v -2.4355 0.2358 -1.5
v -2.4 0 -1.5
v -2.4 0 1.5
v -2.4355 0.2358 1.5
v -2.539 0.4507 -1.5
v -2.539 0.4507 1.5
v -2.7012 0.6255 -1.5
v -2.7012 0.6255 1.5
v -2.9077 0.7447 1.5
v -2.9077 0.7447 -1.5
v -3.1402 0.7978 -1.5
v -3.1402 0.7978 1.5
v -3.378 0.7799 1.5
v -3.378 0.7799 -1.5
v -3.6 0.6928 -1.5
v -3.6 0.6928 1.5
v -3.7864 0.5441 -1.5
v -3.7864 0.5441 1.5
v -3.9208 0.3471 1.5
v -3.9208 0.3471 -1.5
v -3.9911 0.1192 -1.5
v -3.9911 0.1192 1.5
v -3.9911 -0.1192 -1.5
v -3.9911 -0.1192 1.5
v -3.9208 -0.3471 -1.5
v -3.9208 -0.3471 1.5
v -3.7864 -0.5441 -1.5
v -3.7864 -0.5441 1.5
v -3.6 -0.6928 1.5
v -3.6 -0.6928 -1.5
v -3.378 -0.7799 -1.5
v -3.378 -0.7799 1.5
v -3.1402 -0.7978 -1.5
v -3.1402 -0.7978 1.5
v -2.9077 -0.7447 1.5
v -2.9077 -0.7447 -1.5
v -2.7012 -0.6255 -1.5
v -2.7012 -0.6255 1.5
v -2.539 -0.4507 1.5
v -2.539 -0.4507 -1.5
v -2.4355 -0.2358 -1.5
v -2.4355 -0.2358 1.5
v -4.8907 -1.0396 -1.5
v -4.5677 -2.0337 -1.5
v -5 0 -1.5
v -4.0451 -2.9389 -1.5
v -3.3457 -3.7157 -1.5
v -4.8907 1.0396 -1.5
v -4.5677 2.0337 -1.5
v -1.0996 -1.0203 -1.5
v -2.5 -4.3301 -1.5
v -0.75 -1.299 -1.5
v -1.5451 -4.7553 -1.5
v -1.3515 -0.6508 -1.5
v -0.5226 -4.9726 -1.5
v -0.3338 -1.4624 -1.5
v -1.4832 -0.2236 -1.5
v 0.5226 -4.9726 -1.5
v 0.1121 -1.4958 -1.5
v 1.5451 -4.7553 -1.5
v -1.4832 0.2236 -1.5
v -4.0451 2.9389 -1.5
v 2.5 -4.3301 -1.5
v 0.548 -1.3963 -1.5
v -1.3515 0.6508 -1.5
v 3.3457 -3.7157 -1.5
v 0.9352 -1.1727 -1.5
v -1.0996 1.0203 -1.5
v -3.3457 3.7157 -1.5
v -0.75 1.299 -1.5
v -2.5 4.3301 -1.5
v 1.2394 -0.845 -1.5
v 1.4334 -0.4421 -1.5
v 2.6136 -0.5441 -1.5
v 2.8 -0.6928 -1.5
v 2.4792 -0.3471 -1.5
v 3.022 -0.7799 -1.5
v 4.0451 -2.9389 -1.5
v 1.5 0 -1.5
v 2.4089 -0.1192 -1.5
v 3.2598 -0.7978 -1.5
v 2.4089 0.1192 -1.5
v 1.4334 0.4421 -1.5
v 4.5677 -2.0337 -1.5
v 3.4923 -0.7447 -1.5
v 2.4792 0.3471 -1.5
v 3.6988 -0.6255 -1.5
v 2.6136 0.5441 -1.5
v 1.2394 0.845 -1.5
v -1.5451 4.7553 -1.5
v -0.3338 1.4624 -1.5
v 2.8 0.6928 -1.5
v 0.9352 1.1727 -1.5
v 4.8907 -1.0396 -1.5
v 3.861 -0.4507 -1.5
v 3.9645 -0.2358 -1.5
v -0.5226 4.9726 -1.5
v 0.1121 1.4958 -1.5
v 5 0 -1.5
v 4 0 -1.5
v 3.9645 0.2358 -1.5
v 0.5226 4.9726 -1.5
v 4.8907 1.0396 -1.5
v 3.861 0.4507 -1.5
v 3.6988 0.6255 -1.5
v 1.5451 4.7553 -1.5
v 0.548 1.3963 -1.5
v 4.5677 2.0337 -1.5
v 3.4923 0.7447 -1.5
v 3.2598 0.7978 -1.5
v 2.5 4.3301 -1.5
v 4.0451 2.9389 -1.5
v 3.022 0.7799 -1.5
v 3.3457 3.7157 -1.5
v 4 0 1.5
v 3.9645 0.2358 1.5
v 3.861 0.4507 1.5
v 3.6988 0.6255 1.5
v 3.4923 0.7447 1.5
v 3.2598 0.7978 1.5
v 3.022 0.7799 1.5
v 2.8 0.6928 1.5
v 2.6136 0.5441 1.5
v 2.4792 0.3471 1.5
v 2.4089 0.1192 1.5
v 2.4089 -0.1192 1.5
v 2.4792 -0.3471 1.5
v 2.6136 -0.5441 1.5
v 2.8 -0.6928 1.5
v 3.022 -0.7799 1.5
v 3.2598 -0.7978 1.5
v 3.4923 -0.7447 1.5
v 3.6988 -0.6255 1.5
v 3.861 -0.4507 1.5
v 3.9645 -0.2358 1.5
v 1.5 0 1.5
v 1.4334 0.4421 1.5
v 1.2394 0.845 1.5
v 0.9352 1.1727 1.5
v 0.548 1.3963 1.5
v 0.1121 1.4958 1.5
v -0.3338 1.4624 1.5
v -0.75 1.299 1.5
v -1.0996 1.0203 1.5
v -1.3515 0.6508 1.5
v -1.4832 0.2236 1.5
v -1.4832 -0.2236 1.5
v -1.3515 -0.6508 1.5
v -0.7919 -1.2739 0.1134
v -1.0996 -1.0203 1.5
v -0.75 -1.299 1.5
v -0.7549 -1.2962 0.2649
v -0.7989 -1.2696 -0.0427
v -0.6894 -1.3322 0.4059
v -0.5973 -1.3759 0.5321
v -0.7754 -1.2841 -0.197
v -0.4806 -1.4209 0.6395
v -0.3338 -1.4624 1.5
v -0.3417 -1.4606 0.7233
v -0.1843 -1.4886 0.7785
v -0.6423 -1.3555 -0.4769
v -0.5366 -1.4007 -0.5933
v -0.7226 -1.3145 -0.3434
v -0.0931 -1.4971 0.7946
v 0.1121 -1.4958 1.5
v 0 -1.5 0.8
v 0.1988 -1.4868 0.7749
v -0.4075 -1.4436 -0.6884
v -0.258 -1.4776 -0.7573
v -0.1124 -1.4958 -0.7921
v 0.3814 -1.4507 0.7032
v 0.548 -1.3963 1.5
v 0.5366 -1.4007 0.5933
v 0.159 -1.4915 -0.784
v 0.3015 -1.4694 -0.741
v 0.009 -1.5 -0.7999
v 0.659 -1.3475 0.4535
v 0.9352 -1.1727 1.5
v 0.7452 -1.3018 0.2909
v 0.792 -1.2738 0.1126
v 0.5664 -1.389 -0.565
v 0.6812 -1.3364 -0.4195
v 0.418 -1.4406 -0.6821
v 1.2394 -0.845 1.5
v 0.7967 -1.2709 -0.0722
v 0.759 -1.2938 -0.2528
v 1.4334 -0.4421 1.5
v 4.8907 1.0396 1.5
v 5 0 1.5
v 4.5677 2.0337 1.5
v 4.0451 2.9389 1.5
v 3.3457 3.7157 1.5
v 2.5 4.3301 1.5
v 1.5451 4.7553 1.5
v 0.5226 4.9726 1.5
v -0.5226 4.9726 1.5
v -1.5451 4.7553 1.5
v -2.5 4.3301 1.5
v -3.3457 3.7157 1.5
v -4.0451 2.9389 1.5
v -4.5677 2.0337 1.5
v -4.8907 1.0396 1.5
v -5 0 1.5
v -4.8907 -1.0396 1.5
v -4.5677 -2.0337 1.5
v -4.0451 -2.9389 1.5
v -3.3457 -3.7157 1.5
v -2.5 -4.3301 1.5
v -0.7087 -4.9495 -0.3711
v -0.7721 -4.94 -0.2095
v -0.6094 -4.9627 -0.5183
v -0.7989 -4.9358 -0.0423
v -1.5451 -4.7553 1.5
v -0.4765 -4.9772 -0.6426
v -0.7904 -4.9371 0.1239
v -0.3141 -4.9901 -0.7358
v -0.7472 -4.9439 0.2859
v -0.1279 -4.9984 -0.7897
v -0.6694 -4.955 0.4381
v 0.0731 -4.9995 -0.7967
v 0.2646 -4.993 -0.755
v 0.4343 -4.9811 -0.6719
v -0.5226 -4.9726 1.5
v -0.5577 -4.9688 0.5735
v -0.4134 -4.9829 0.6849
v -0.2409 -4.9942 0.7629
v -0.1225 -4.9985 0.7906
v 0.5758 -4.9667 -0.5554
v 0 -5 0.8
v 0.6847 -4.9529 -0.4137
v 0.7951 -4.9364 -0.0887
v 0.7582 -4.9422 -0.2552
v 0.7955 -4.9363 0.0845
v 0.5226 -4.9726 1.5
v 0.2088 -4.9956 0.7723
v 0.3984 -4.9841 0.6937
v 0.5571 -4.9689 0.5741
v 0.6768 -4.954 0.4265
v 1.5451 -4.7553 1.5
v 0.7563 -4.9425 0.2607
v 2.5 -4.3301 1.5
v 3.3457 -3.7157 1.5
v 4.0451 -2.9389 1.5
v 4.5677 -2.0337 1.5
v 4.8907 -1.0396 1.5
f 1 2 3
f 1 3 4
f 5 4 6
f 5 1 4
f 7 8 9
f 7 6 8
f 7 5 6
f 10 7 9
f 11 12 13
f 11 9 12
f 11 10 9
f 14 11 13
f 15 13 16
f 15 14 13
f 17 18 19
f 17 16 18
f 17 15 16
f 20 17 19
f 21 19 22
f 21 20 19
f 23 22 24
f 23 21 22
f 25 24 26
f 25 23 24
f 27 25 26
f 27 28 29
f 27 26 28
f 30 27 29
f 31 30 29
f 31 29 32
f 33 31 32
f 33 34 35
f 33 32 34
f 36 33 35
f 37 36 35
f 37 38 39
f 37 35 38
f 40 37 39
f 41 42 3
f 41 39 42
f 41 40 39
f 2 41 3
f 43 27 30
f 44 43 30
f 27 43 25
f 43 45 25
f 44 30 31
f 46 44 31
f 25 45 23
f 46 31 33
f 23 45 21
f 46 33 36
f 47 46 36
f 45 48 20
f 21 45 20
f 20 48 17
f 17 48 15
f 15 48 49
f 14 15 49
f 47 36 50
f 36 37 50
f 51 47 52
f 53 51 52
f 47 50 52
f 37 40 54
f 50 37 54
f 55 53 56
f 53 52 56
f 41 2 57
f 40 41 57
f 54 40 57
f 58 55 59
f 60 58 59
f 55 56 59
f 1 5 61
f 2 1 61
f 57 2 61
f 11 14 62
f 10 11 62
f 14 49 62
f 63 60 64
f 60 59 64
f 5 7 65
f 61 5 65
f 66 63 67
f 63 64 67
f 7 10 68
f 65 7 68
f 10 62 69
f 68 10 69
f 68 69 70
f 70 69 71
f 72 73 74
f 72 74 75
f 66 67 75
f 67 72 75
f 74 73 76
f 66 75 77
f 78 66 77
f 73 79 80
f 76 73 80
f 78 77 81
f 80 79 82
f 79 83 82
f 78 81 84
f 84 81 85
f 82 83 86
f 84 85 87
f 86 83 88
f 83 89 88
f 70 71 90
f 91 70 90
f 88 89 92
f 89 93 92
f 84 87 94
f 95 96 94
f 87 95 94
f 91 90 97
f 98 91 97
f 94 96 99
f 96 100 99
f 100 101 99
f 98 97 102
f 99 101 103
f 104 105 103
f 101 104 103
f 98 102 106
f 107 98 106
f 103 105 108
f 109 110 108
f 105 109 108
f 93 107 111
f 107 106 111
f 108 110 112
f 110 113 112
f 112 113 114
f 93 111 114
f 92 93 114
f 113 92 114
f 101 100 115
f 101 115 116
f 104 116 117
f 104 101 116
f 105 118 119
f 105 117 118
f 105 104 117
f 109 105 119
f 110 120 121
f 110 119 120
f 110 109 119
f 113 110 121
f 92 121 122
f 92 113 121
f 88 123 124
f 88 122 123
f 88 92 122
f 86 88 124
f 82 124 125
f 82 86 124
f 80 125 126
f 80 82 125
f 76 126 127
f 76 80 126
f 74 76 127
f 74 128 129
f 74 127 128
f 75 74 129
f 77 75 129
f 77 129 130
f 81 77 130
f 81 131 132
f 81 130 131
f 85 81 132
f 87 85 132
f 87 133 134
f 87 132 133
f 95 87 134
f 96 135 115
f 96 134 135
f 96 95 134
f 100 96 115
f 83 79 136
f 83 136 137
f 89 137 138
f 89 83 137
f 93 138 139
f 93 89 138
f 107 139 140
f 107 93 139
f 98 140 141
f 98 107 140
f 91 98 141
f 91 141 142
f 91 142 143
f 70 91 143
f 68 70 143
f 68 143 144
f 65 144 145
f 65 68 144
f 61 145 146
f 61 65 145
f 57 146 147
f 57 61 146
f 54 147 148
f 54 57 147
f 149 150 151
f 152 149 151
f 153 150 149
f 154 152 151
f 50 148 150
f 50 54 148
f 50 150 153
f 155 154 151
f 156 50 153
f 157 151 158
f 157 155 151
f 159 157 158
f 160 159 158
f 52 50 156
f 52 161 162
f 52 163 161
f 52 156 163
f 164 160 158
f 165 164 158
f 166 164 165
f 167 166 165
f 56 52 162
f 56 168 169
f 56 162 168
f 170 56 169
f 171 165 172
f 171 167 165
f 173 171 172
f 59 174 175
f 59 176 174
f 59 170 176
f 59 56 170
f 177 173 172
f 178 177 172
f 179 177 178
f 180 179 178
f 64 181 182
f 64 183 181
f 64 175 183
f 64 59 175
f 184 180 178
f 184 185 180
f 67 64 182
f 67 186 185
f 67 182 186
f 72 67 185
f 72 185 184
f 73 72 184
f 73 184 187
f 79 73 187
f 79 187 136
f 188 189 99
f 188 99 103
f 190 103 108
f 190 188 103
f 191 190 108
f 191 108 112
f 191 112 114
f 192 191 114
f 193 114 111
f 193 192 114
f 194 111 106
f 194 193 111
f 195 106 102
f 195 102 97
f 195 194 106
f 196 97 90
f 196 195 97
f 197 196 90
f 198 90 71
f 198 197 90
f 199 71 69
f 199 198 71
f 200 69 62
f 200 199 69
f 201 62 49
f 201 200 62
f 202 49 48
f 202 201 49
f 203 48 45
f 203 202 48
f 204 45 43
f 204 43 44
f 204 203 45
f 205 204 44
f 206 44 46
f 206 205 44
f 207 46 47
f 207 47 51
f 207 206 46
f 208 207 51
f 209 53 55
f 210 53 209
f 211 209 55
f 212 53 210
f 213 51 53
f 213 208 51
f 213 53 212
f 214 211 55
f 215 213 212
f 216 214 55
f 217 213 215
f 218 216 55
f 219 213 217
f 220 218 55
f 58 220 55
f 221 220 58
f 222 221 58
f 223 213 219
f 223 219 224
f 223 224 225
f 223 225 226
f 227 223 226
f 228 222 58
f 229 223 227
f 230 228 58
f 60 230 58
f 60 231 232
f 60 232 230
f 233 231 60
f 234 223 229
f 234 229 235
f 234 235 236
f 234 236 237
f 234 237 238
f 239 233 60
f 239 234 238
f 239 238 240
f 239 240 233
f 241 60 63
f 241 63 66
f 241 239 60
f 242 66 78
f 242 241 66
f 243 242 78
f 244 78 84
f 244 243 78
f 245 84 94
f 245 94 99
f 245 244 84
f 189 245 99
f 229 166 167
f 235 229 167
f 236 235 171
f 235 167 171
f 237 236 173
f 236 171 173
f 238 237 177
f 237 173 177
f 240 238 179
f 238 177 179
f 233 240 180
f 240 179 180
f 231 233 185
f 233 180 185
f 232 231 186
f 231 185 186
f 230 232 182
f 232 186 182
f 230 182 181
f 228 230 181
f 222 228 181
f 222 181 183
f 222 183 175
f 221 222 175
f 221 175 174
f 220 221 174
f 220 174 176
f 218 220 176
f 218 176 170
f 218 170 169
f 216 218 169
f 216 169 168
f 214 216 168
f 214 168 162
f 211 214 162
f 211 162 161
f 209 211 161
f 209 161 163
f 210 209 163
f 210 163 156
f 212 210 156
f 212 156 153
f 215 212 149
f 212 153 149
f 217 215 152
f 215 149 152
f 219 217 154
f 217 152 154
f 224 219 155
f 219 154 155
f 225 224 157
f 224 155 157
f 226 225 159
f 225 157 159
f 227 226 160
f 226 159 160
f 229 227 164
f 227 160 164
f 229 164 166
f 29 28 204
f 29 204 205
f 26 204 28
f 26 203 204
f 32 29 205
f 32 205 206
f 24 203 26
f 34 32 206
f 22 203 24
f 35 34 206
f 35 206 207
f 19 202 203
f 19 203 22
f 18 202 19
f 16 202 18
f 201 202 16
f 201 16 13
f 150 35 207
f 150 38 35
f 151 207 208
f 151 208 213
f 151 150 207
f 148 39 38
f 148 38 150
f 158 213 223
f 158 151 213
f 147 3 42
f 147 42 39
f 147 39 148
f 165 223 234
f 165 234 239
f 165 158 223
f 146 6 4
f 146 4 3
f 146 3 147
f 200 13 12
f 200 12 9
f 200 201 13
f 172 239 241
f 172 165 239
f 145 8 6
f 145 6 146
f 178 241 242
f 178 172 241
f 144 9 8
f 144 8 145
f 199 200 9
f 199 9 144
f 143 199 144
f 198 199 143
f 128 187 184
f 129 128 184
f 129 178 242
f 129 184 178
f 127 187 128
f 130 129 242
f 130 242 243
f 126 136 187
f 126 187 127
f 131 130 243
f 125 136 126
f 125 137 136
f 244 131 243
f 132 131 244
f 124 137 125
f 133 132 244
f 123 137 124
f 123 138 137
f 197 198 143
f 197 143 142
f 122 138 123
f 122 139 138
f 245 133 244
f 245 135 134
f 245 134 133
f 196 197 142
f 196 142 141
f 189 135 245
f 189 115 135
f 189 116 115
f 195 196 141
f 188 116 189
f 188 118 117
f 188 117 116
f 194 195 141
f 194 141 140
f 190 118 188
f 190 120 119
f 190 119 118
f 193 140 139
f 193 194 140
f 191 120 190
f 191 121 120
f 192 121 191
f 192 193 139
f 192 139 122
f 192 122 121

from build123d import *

# Parameters (mm, degrees)
SKETCH1_R           = 5
SKETCH1_R_2         = 1.5
EXTRUDE1_DEPTH      = 1.5
EXTRUDE2_DEPTH      = 8.228416147
EXTRUDE2_DEPTH_BACK = 8.228416147
SKETCH2_R           = 0.8
SKETCH3_R           = 0.8
EXTRUDE3_DEPTH      = 8.228416147


with BuildPart() as part:
    # Sketch1 → Extrude1 (new, symmetric)
    with BuildSketch(Plane.XY):
        Circle(SKETCH1_R)
        Circle(SKETCH1_R_2, mode=Mode.SUBTRACT)
    extrude(amount=EXTRUDE1_DEPTH, both=True)

    # Sketch2 → Extrude2 (cut, two sides: drawn at the far end of the back side and taken through both)
    with BuildSketch(Plane.XY.offset(-EXTRUDE2_DEPTH_BACK)):
        with Locations((-3.2, 0)):
            Circle(SKETCH2_R)
        with Locations((3.2, 0)):
            Circle(SKETCH2_R)
    extrude(amount=EXTRUDE2_DEPTH + EXTRUDE2_DEPTH_BACK, mode=Mode.SUBTRACT)

    # Sketch3 → Extrude3 (cut, through all)
    with BuildSketch(Plane(origin=(0, 0, 0), x_dir=(1, 0, 0), z_dir=(0, 1, 0))):
        with Locations(Location((0, 0, 0), (0, 0, 270))):
            Circle(SKETCH3_R)
    extrude(amount=-EXTRUDE3_DEPTH, mode=Mode.SUBTRACT)


solid = part.part
